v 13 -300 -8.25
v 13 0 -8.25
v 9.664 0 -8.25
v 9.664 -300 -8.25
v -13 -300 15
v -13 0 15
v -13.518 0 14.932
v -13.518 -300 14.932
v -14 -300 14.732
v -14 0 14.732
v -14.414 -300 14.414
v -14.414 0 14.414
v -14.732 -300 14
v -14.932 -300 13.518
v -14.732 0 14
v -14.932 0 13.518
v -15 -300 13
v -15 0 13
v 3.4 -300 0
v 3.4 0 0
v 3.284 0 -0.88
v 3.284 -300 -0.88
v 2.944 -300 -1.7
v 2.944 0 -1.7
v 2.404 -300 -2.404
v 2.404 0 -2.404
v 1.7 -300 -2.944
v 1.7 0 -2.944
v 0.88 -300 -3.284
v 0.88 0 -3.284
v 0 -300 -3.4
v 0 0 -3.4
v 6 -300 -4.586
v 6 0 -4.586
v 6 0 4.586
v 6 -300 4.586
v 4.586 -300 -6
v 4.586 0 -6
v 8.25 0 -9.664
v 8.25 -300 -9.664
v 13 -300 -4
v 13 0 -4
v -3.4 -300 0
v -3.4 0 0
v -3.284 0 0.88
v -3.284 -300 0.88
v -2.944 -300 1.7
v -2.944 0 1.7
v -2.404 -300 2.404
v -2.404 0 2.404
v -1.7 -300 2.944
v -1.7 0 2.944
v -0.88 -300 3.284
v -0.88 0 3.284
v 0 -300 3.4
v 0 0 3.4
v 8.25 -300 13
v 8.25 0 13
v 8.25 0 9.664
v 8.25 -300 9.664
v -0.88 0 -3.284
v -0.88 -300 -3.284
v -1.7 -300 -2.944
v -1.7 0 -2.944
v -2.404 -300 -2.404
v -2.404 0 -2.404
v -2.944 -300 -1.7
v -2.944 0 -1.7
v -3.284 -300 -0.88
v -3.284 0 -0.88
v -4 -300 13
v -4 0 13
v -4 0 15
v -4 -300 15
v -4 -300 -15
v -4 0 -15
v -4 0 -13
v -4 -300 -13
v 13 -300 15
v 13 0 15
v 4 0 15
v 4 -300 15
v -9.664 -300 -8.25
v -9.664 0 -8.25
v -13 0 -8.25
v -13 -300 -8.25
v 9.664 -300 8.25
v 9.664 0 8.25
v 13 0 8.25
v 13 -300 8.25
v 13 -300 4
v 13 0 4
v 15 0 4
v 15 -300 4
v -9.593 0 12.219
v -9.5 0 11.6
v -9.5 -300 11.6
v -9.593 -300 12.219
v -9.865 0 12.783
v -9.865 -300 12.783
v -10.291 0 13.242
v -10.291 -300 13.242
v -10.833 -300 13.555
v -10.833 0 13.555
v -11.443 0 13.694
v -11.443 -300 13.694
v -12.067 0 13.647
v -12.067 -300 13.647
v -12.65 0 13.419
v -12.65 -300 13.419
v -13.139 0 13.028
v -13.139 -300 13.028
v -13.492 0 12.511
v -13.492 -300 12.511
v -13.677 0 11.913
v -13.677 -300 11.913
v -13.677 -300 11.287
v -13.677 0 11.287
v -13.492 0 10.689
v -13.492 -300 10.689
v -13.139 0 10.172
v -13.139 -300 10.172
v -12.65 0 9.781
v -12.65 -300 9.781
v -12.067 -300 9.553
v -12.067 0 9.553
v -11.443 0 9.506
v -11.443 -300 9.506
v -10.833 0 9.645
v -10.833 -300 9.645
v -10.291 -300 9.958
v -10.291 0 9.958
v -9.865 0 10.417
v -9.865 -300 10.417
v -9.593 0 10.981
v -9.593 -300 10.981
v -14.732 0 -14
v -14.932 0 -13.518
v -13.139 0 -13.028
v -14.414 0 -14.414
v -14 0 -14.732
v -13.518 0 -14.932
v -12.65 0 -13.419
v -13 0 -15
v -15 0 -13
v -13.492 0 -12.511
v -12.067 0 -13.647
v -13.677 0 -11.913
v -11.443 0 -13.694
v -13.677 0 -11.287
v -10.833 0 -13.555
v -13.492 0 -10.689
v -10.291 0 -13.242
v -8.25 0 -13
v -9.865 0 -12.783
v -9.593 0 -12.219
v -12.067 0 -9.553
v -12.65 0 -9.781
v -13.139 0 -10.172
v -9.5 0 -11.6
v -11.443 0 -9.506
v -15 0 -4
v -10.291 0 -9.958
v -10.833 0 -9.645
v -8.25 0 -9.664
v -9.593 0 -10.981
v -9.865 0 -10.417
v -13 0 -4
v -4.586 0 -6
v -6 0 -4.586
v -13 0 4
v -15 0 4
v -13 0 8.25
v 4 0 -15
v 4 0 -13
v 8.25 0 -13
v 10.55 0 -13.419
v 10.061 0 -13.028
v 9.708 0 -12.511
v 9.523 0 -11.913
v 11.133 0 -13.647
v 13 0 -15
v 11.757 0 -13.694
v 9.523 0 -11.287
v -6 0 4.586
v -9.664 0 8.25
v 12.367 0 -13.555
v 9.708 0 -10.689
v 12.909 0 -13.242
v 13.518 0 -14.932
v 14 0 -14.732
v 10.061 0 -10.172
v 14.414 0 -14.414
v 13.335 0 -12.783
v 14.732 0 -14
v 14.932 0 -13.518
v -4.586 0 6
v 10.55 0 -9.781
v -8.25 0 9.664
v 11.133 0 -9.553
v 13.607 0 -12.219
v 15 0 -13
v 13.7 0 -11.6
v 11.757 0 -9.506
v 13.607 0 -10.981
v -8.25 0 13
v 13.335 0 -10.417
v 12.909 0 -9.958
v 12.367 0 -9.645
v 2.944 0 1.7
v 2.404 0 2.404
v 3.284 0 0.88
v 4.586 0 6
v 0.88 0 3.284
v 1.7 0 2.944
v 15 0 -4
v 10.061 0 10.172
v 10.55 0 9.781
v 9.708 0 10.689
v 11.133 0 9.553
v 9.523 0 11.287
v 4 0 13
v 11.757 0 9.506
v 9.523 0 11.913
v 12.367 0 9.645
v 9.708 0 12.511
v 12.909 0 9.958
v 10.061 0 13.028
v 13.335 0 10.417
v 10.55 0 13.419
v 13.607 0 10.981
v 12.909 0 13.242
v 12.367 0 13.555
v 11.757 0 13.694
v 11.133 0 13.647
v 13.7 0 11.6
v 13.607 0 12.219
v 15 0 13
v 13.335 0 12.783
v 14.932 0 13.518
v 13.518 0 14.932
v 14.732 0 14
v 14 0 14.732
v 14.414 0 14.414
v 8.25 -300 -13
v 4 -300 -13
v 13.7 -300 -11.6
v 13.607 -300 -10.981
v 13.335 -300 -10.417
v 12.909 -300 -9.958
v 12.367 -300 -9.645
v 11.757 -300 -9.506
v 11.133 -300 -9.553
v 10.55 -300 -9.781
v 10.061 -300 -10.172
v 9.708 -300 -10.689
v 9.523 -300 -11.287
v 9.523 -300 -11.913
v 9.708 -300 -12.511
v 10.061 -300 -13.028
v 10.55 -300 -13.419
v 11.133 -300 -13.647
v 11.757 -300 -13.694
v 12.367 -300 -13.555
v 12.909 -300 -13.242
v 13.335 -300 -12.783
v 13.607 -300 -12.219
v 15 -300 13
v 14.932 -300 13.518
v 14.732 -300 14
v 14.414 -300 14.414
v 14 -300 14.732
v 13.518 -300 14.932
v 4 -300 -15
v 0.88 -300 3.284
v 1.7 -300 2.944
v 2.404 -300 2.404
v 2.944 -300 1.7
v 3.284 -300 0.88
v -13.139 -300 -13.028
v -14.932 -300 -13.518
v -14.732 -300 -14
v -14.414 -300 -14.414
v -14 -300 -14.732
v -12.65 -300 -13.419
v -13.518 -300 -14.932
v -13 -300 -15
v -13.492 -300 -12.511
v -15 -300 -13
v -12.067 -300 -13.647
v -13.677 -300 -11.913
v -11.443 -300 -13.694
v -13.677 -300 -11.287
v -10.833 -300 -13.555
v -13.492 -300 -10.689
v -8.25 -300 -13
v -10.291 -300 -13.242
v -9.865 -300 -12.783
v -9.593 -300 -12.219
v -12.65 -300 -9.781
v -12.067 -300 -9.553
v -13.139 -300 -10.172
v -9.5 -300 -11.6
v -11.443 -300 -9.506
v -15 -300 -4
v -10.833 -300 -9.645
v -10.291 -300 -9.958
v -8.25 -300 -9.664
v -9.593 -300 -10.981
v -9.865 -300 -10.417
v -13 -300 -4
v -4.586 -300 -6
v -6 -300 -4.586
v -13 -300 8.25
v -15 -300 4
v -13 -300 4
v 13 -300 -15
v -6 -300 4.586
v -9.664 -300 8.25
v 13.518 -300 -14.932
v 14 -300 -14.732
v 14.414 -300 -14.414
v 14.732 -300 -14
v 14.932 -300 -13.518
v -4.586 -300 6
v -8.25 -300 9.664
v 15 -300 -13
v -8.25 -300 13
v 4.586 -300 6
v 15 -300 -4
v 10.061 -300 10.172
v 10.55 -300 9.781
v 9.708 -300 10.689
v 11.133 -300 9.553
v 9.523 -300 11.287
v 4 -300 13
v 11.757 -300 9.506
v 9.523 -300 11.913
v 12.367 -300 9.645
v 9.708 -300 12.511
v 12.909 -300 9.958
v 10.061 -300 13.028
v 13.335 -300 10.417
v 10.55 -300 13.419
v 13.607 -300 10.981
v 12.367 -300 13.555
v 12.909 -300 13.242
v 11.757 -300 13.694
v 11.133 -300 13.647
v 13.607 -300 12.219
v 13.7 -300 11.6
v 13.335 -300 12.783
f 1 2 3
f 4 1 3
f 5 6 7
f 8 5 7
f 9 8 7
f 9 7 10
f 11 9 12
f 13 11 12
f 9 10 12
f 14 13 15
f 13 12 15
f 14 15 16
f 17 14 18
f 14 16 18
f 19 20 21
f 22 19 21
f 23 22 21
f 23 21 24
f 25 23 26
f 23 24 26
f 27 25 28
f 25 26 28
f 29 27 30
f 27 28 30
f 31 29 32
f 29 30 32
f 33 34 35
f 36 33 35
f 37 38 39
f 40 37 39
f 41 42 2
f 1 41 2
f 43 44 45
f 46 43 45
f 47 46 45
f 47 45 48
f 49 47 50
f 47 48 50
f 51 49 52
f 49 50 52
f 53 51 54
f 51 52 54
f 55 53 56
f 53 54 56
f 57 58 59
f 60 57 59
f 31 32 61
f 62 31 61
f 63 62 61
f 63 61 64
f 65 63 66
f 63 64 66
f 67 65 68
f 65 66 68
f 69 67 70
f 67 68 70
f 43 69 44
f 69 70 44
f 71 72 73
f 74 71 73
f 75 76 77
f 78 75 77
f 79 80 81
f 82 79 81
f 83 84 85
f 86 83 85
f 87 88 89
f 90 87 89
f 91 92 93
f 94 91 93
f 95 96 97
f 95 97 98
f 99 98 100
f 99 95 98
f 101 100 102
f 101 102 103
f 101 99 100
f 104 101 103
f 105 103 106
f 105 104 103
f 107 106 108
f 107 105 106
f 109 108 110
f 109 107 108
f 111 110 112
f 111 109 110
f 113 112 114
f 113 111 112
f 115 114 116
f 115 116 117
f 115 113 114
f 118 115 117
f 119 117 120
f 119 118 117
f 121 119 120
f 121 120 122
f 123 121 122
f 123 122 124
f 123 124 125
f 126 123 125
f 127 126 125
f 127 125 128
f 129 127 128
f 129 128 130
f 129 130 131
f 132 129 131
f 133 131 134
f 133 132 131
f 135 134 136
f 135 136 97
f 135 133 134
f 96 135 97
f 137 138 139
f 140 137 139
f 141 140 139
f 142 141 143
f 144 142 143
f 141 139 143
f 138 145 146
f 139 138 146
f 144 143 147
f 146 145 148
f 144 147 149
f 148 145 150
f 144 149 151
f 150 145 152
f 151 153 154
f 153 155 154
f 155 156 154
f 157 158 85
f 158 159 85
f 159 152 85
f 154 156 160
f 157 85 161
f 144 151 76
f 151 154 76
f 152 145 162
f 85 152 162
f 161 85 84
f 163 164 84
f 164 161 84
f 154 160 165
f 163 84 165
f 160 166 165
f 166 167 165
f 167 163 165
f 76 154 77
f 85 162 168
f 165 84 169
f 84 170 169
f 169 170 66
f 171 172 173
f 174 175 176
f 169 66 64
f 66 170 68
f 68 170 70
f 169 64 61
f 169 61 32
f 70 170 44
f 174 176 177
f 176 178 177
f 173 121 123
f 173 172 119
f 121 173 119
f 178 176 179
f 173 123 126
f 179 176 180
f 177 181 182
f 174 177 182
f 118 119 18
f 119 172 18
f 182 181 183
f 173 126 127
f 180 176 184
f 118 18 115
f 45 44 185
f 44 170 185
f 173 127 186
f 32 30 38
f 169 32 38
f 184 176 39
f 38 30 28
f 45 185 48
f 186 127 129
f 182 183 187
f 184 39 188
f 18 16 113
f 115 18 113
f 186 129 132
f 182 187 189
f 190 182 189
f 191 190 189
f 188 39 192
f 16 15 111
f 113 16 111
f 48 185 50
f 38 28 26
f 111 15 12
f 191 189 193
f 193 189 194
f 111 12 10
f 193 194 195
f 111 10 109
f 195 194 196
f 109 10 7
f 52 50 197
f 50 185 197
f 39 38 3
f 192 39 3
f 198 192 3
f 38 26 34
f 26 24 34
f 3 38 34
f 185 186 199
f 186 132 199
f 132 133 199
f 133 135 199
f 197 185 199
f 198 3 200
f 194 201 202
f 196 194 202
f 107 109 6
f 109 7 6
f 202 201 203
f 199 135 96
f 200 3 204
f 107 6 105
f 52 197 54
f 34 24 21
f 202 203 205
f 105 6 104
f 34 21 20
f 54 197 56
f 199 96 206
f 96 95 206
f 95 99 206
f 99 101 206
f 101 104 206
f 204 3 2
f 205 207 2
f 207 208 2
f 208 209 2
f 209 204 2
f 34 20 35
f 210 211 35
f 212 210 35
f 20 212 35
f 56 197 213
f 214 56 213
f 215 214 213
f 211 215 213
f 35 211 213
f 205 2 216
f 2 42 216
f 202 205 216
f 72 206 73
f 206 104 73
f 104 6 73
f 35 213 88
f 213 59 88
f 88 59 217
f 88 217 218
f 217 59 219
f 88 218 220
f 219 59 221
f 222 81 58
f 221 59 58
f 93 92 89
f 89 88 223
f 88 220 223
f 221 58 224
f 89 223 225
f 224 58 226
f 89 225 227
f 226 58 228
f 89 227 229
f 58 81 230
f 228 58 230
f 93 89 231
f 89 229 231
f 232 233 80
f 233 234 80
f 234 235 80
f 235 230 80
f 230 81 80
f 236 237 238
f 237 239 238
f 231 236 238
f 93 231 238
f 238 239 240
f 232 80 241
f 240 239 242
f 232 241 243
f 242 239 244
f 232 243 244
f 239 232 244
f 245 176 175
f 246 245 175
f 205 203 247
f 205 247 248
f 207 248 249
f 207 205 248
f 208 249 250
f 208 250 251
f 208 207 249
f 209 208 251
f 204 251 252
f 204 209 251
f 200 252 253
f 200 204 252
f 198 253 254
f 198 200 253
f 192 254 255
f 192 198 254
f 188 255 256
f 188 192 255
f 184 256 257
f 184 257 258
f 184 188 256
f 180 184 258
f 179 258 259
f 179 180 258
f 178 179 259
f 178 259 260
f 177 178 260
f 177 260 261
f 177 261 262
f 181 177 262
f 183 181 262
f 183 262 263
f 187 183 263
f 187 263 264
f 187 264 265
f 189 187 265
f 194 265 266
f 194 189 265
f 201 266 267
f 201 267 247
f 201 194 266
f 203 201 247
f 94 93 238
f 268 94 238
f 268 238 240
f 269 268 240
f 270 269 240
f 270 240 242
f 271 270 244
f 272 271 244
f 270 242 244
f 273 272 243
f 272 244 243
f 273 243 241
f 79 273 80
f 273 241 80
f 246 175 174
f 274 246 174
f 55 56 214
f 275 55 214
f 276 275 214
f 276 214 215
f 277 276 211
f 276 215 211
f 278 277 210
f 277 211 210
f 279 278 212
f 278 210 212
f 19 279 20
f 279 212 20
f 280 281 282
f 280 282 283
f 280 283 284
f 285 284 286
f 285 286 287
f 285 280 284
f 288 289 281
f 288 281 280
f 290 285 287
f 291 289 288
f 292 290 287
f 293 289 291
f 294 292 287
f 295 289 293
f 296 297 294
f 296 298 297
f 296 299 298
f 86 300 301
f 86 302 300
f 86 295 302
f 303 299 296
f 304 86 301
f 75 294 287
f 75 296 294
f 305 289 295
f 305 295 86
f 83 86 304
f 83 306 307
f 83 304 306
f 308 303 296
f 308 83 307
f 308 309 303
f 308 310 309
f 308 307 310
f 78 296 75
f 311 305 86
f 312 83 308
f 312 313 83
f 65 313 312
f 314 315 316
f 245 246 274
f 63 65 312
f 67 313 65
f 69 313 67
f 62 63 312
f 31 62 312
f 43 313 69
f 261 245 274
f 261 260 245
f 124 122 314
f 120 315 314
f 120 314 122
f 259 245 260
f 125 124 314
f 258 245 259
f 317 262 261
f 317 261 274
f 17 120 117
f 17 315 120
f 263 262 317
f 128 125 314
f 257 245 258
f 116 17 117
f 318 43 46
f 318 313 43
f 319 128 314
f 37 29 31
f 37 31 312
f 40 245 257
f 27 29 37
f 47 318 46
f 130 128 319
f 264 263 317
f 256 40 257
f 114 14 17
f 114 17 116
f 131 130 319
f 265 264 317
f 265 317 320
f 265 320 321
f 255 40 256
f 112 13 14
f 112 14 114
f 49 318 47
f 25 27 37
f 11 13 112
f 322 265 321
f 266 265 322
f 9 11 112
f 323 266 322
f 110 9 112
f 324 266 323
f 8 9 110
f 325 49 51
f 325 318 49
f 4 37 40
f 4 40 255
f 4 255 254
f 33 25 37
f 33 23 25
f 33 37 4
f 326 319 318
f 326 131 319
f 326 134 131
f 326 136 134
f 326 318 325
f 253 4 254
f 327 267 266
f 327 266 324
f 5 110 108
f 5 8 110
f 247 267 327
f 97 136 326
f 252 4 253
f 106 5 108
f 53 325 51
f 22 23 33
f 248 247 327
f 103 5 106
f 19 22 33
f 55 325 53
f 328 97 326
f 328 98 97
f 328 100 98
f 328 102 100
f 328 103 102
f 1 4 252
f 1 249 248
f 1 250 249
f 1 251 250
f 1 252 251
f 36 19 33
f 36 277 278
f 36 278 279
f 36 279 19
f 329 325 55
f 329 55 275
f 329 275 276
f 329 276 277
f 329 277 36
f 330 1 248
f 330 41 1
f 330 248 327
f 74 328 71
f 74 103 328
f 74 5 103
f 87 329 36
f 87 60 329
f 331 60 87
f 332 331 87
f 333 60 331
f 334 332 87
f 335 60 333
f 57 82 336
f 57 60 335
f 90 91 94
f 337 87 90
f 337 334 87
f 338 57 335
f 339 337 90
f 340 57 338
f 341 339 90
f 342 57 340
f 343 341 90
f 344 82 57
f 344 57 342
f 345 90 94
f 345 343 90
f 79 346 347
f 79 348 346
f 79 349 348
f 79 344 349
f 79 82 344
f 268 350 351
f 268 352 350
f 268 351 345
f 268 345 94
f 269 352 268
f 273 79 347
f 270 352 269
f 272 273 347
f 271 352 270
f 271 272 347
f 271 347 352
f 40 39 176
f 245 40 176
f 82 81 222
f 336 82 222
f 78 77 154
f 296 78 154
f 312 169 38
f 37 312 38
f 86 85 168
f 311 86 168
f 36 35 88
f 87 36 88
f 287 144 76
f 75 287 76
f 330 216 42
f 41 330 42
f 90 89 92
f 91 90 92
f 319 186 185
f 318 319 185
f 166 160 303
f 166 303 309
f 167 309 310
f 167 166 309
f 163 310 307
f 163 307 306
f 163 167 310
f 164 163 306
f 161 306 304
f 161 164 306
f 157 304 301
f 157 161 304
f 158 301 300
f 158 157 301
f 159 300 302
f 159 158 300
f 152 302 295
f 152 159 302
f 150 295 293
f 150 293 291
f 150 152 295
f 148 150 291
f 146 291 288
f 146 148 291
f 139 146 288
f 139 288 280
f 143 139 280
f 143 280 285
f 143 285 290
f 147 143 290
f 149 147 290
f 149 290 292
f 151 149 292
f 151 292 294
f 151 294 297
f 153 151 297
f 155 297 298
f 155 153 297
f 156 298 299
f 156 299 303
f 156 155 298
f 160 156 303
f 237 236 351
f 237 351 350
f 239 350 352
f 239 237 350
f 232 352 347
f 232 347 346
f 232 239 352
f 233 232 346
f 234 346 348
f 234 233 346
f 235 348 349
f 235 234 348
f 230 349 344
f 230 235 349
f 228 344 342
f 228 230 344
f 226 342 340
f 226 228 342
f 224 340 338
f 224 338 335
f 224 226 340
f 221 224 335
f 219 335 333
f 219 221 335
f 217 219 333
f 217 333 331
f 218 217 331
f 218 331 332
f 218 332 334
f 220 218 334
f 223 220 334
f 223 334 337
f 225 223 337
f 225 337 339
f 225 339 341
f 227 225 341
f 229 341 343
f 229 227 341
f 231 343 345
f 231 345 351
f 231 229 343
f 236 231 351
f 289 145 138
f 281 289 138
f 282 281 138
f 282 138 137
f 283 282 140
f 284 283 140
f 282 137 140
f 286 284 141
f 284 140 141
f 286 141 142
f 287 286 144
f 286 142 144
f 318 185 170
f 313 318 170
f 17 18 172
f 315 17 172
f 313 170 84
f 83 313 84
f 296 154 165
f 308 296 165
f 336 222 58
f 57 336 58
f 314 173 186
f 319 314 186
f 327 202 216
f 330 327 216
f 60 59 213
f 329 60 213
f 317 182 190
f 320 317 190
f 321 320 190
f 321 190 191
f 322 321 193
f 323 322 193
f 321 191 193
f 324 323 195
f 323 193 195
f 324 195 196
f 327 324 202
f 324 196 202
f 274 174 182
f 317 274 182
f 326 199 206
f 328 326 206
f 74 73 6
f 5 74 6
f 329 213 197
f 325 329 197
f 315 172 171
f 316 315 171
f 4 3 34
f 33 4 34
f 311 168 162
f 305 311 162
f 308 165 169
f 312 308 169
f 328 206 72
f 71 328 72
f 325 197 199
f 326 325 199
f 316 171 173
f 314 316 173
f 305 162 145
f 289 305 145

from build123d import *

# Parameters (mm, degrees)
F0_R     = 2.1
F1_DEPTH = 300


with BuildPart() as f1:
    # F0 (on Front) → F1 (new body)
    with BuildSketch(Plane.XZ):
        with BuildLine():
            Line((4.585786, 6), (0, 6))
            Line((0, 6), (-4.585786, 6))
            Line((-4.585786, 6), (-8.25, 9.664214))
            Line((-8.25, 9.664214), (-8.25, 13))
            Line((-8.25, 13), (-4, 13))
            Line((-4, 13), (-4, 15))
            Line((-4, 15), (-13, 15))
            ThreePointArc((-13, 15), (-14.414214, 14.414214), (-15, 13))
            Line((-15, 13), (-15, 4))
            Line((-15, 4), (-13, 4))
            Line((-13, 4), (-13, 8.25))
            Line((-13, 8.25), (-9.664214, 8.25))
            Line((-9.664214, 8.25), (-6, 4.585786))
            Line((-6, 4.585786), (-6, 0))
            Line((-6, 0), (-6, -4.585786))
            Line((-6, -4.585786), (-9.664214, -8.25))
            Line((-9.664214, -8.25), (-13, -8.25))
            Line((-13, -8.25), (-13, -4))
            Line((-13, -4), (-15, -4))
            Line((-15, -4), (-15, -13))
            ThreePointArc((-15, -13), (-14.414214, -14.414214), (-13, -15))
            Line((-13, -15), (-4, -15))
            Line((-4, -15), (-4, -13))
            Line((-4, -13), (-8.25, -13))
            Line((-8.25, -13), (-8.25, -9.664214))
            Line((-8.25, -9.664214), (-4.585786, -6))
            Line((-4.585786, -6), (0, -6))
            Line((0, -6), (4.585786, -6))
            Line((4.585786, -6), (8.25, -9.664214))
            Line((8.25, -9.664214), (8.25, -13))
            Line((8.25, -13), (4, -13))
            Line((4, -13), (4, -15))
            Line((4, -15), (13, -15))
            ThreePointArc((13, -15), (14.414214, -14.414214), (15, -13))
            Line((15, -13), (15, -4))
            Line((15, -4), (13, -4))
            Line((13, -4), (13, -8.25))
            Line((13, -8.25), (9.664214, -8.25))
            Line((9.664214, -8.25), (6, -4.585786))
            Line((6, -4.585786), (6, 0))
            Line((6, 0), (6, 4.585786))
            Line((6, 4.585786), (9.664214, 8.25))
            Line((9.664214, 8.25), (13, 8.25))
            Line((13, 8.25), (13, 4))
            Line((13, 4), (15, 4))
            Line((15, 4), (15, 13))
            ThreePointArc((15, 13), (14.414214, 14.414214), (13, 15))
            Line((13, 15), (4, 15))
            Line((4, 15), (4, 13))
            Line((4, 13), (8.25, 13))
            Line((8.25, 13), (8.25, 9.664214))
            Line((8.25, 9.664214), (4.585786, 6))
        make_face()
        with Locations((-11.6, -11.6)):
            Circle(F0_R, mode=Mode.SUBTRACT)
        with Locations((11.6, -11.6)):
            Circle(F0_R, mode=Mode.SUBTRACT)
        with Locations((-11.6, 11.6)):
            Circle(F0_R, mode=Mode.SUBTRACT)
        with BuildLine():
            ThreePointArc((-3.4, 0), (-2.404163, 2.404163), (0, 3.4))
            ThreePointArc((0, 3.4), (2.404163, 2.404163), (3.4, 0))
            ThreePointArc((3.4, 0), (2.404163, -2.404163), (0, -3.4))
            ThreePointArc((0, -3.4), (-2.404163, -2.404163), (-3.4, 0))
        make_face(mode=Mode.SUBTRACT)
        with Locations((11.6, 11.6)):
            Circle(F0_R, mode=Mode.SUBTRACT)
    extrude(amount=F1_DEPTH)


solid = f1.part
